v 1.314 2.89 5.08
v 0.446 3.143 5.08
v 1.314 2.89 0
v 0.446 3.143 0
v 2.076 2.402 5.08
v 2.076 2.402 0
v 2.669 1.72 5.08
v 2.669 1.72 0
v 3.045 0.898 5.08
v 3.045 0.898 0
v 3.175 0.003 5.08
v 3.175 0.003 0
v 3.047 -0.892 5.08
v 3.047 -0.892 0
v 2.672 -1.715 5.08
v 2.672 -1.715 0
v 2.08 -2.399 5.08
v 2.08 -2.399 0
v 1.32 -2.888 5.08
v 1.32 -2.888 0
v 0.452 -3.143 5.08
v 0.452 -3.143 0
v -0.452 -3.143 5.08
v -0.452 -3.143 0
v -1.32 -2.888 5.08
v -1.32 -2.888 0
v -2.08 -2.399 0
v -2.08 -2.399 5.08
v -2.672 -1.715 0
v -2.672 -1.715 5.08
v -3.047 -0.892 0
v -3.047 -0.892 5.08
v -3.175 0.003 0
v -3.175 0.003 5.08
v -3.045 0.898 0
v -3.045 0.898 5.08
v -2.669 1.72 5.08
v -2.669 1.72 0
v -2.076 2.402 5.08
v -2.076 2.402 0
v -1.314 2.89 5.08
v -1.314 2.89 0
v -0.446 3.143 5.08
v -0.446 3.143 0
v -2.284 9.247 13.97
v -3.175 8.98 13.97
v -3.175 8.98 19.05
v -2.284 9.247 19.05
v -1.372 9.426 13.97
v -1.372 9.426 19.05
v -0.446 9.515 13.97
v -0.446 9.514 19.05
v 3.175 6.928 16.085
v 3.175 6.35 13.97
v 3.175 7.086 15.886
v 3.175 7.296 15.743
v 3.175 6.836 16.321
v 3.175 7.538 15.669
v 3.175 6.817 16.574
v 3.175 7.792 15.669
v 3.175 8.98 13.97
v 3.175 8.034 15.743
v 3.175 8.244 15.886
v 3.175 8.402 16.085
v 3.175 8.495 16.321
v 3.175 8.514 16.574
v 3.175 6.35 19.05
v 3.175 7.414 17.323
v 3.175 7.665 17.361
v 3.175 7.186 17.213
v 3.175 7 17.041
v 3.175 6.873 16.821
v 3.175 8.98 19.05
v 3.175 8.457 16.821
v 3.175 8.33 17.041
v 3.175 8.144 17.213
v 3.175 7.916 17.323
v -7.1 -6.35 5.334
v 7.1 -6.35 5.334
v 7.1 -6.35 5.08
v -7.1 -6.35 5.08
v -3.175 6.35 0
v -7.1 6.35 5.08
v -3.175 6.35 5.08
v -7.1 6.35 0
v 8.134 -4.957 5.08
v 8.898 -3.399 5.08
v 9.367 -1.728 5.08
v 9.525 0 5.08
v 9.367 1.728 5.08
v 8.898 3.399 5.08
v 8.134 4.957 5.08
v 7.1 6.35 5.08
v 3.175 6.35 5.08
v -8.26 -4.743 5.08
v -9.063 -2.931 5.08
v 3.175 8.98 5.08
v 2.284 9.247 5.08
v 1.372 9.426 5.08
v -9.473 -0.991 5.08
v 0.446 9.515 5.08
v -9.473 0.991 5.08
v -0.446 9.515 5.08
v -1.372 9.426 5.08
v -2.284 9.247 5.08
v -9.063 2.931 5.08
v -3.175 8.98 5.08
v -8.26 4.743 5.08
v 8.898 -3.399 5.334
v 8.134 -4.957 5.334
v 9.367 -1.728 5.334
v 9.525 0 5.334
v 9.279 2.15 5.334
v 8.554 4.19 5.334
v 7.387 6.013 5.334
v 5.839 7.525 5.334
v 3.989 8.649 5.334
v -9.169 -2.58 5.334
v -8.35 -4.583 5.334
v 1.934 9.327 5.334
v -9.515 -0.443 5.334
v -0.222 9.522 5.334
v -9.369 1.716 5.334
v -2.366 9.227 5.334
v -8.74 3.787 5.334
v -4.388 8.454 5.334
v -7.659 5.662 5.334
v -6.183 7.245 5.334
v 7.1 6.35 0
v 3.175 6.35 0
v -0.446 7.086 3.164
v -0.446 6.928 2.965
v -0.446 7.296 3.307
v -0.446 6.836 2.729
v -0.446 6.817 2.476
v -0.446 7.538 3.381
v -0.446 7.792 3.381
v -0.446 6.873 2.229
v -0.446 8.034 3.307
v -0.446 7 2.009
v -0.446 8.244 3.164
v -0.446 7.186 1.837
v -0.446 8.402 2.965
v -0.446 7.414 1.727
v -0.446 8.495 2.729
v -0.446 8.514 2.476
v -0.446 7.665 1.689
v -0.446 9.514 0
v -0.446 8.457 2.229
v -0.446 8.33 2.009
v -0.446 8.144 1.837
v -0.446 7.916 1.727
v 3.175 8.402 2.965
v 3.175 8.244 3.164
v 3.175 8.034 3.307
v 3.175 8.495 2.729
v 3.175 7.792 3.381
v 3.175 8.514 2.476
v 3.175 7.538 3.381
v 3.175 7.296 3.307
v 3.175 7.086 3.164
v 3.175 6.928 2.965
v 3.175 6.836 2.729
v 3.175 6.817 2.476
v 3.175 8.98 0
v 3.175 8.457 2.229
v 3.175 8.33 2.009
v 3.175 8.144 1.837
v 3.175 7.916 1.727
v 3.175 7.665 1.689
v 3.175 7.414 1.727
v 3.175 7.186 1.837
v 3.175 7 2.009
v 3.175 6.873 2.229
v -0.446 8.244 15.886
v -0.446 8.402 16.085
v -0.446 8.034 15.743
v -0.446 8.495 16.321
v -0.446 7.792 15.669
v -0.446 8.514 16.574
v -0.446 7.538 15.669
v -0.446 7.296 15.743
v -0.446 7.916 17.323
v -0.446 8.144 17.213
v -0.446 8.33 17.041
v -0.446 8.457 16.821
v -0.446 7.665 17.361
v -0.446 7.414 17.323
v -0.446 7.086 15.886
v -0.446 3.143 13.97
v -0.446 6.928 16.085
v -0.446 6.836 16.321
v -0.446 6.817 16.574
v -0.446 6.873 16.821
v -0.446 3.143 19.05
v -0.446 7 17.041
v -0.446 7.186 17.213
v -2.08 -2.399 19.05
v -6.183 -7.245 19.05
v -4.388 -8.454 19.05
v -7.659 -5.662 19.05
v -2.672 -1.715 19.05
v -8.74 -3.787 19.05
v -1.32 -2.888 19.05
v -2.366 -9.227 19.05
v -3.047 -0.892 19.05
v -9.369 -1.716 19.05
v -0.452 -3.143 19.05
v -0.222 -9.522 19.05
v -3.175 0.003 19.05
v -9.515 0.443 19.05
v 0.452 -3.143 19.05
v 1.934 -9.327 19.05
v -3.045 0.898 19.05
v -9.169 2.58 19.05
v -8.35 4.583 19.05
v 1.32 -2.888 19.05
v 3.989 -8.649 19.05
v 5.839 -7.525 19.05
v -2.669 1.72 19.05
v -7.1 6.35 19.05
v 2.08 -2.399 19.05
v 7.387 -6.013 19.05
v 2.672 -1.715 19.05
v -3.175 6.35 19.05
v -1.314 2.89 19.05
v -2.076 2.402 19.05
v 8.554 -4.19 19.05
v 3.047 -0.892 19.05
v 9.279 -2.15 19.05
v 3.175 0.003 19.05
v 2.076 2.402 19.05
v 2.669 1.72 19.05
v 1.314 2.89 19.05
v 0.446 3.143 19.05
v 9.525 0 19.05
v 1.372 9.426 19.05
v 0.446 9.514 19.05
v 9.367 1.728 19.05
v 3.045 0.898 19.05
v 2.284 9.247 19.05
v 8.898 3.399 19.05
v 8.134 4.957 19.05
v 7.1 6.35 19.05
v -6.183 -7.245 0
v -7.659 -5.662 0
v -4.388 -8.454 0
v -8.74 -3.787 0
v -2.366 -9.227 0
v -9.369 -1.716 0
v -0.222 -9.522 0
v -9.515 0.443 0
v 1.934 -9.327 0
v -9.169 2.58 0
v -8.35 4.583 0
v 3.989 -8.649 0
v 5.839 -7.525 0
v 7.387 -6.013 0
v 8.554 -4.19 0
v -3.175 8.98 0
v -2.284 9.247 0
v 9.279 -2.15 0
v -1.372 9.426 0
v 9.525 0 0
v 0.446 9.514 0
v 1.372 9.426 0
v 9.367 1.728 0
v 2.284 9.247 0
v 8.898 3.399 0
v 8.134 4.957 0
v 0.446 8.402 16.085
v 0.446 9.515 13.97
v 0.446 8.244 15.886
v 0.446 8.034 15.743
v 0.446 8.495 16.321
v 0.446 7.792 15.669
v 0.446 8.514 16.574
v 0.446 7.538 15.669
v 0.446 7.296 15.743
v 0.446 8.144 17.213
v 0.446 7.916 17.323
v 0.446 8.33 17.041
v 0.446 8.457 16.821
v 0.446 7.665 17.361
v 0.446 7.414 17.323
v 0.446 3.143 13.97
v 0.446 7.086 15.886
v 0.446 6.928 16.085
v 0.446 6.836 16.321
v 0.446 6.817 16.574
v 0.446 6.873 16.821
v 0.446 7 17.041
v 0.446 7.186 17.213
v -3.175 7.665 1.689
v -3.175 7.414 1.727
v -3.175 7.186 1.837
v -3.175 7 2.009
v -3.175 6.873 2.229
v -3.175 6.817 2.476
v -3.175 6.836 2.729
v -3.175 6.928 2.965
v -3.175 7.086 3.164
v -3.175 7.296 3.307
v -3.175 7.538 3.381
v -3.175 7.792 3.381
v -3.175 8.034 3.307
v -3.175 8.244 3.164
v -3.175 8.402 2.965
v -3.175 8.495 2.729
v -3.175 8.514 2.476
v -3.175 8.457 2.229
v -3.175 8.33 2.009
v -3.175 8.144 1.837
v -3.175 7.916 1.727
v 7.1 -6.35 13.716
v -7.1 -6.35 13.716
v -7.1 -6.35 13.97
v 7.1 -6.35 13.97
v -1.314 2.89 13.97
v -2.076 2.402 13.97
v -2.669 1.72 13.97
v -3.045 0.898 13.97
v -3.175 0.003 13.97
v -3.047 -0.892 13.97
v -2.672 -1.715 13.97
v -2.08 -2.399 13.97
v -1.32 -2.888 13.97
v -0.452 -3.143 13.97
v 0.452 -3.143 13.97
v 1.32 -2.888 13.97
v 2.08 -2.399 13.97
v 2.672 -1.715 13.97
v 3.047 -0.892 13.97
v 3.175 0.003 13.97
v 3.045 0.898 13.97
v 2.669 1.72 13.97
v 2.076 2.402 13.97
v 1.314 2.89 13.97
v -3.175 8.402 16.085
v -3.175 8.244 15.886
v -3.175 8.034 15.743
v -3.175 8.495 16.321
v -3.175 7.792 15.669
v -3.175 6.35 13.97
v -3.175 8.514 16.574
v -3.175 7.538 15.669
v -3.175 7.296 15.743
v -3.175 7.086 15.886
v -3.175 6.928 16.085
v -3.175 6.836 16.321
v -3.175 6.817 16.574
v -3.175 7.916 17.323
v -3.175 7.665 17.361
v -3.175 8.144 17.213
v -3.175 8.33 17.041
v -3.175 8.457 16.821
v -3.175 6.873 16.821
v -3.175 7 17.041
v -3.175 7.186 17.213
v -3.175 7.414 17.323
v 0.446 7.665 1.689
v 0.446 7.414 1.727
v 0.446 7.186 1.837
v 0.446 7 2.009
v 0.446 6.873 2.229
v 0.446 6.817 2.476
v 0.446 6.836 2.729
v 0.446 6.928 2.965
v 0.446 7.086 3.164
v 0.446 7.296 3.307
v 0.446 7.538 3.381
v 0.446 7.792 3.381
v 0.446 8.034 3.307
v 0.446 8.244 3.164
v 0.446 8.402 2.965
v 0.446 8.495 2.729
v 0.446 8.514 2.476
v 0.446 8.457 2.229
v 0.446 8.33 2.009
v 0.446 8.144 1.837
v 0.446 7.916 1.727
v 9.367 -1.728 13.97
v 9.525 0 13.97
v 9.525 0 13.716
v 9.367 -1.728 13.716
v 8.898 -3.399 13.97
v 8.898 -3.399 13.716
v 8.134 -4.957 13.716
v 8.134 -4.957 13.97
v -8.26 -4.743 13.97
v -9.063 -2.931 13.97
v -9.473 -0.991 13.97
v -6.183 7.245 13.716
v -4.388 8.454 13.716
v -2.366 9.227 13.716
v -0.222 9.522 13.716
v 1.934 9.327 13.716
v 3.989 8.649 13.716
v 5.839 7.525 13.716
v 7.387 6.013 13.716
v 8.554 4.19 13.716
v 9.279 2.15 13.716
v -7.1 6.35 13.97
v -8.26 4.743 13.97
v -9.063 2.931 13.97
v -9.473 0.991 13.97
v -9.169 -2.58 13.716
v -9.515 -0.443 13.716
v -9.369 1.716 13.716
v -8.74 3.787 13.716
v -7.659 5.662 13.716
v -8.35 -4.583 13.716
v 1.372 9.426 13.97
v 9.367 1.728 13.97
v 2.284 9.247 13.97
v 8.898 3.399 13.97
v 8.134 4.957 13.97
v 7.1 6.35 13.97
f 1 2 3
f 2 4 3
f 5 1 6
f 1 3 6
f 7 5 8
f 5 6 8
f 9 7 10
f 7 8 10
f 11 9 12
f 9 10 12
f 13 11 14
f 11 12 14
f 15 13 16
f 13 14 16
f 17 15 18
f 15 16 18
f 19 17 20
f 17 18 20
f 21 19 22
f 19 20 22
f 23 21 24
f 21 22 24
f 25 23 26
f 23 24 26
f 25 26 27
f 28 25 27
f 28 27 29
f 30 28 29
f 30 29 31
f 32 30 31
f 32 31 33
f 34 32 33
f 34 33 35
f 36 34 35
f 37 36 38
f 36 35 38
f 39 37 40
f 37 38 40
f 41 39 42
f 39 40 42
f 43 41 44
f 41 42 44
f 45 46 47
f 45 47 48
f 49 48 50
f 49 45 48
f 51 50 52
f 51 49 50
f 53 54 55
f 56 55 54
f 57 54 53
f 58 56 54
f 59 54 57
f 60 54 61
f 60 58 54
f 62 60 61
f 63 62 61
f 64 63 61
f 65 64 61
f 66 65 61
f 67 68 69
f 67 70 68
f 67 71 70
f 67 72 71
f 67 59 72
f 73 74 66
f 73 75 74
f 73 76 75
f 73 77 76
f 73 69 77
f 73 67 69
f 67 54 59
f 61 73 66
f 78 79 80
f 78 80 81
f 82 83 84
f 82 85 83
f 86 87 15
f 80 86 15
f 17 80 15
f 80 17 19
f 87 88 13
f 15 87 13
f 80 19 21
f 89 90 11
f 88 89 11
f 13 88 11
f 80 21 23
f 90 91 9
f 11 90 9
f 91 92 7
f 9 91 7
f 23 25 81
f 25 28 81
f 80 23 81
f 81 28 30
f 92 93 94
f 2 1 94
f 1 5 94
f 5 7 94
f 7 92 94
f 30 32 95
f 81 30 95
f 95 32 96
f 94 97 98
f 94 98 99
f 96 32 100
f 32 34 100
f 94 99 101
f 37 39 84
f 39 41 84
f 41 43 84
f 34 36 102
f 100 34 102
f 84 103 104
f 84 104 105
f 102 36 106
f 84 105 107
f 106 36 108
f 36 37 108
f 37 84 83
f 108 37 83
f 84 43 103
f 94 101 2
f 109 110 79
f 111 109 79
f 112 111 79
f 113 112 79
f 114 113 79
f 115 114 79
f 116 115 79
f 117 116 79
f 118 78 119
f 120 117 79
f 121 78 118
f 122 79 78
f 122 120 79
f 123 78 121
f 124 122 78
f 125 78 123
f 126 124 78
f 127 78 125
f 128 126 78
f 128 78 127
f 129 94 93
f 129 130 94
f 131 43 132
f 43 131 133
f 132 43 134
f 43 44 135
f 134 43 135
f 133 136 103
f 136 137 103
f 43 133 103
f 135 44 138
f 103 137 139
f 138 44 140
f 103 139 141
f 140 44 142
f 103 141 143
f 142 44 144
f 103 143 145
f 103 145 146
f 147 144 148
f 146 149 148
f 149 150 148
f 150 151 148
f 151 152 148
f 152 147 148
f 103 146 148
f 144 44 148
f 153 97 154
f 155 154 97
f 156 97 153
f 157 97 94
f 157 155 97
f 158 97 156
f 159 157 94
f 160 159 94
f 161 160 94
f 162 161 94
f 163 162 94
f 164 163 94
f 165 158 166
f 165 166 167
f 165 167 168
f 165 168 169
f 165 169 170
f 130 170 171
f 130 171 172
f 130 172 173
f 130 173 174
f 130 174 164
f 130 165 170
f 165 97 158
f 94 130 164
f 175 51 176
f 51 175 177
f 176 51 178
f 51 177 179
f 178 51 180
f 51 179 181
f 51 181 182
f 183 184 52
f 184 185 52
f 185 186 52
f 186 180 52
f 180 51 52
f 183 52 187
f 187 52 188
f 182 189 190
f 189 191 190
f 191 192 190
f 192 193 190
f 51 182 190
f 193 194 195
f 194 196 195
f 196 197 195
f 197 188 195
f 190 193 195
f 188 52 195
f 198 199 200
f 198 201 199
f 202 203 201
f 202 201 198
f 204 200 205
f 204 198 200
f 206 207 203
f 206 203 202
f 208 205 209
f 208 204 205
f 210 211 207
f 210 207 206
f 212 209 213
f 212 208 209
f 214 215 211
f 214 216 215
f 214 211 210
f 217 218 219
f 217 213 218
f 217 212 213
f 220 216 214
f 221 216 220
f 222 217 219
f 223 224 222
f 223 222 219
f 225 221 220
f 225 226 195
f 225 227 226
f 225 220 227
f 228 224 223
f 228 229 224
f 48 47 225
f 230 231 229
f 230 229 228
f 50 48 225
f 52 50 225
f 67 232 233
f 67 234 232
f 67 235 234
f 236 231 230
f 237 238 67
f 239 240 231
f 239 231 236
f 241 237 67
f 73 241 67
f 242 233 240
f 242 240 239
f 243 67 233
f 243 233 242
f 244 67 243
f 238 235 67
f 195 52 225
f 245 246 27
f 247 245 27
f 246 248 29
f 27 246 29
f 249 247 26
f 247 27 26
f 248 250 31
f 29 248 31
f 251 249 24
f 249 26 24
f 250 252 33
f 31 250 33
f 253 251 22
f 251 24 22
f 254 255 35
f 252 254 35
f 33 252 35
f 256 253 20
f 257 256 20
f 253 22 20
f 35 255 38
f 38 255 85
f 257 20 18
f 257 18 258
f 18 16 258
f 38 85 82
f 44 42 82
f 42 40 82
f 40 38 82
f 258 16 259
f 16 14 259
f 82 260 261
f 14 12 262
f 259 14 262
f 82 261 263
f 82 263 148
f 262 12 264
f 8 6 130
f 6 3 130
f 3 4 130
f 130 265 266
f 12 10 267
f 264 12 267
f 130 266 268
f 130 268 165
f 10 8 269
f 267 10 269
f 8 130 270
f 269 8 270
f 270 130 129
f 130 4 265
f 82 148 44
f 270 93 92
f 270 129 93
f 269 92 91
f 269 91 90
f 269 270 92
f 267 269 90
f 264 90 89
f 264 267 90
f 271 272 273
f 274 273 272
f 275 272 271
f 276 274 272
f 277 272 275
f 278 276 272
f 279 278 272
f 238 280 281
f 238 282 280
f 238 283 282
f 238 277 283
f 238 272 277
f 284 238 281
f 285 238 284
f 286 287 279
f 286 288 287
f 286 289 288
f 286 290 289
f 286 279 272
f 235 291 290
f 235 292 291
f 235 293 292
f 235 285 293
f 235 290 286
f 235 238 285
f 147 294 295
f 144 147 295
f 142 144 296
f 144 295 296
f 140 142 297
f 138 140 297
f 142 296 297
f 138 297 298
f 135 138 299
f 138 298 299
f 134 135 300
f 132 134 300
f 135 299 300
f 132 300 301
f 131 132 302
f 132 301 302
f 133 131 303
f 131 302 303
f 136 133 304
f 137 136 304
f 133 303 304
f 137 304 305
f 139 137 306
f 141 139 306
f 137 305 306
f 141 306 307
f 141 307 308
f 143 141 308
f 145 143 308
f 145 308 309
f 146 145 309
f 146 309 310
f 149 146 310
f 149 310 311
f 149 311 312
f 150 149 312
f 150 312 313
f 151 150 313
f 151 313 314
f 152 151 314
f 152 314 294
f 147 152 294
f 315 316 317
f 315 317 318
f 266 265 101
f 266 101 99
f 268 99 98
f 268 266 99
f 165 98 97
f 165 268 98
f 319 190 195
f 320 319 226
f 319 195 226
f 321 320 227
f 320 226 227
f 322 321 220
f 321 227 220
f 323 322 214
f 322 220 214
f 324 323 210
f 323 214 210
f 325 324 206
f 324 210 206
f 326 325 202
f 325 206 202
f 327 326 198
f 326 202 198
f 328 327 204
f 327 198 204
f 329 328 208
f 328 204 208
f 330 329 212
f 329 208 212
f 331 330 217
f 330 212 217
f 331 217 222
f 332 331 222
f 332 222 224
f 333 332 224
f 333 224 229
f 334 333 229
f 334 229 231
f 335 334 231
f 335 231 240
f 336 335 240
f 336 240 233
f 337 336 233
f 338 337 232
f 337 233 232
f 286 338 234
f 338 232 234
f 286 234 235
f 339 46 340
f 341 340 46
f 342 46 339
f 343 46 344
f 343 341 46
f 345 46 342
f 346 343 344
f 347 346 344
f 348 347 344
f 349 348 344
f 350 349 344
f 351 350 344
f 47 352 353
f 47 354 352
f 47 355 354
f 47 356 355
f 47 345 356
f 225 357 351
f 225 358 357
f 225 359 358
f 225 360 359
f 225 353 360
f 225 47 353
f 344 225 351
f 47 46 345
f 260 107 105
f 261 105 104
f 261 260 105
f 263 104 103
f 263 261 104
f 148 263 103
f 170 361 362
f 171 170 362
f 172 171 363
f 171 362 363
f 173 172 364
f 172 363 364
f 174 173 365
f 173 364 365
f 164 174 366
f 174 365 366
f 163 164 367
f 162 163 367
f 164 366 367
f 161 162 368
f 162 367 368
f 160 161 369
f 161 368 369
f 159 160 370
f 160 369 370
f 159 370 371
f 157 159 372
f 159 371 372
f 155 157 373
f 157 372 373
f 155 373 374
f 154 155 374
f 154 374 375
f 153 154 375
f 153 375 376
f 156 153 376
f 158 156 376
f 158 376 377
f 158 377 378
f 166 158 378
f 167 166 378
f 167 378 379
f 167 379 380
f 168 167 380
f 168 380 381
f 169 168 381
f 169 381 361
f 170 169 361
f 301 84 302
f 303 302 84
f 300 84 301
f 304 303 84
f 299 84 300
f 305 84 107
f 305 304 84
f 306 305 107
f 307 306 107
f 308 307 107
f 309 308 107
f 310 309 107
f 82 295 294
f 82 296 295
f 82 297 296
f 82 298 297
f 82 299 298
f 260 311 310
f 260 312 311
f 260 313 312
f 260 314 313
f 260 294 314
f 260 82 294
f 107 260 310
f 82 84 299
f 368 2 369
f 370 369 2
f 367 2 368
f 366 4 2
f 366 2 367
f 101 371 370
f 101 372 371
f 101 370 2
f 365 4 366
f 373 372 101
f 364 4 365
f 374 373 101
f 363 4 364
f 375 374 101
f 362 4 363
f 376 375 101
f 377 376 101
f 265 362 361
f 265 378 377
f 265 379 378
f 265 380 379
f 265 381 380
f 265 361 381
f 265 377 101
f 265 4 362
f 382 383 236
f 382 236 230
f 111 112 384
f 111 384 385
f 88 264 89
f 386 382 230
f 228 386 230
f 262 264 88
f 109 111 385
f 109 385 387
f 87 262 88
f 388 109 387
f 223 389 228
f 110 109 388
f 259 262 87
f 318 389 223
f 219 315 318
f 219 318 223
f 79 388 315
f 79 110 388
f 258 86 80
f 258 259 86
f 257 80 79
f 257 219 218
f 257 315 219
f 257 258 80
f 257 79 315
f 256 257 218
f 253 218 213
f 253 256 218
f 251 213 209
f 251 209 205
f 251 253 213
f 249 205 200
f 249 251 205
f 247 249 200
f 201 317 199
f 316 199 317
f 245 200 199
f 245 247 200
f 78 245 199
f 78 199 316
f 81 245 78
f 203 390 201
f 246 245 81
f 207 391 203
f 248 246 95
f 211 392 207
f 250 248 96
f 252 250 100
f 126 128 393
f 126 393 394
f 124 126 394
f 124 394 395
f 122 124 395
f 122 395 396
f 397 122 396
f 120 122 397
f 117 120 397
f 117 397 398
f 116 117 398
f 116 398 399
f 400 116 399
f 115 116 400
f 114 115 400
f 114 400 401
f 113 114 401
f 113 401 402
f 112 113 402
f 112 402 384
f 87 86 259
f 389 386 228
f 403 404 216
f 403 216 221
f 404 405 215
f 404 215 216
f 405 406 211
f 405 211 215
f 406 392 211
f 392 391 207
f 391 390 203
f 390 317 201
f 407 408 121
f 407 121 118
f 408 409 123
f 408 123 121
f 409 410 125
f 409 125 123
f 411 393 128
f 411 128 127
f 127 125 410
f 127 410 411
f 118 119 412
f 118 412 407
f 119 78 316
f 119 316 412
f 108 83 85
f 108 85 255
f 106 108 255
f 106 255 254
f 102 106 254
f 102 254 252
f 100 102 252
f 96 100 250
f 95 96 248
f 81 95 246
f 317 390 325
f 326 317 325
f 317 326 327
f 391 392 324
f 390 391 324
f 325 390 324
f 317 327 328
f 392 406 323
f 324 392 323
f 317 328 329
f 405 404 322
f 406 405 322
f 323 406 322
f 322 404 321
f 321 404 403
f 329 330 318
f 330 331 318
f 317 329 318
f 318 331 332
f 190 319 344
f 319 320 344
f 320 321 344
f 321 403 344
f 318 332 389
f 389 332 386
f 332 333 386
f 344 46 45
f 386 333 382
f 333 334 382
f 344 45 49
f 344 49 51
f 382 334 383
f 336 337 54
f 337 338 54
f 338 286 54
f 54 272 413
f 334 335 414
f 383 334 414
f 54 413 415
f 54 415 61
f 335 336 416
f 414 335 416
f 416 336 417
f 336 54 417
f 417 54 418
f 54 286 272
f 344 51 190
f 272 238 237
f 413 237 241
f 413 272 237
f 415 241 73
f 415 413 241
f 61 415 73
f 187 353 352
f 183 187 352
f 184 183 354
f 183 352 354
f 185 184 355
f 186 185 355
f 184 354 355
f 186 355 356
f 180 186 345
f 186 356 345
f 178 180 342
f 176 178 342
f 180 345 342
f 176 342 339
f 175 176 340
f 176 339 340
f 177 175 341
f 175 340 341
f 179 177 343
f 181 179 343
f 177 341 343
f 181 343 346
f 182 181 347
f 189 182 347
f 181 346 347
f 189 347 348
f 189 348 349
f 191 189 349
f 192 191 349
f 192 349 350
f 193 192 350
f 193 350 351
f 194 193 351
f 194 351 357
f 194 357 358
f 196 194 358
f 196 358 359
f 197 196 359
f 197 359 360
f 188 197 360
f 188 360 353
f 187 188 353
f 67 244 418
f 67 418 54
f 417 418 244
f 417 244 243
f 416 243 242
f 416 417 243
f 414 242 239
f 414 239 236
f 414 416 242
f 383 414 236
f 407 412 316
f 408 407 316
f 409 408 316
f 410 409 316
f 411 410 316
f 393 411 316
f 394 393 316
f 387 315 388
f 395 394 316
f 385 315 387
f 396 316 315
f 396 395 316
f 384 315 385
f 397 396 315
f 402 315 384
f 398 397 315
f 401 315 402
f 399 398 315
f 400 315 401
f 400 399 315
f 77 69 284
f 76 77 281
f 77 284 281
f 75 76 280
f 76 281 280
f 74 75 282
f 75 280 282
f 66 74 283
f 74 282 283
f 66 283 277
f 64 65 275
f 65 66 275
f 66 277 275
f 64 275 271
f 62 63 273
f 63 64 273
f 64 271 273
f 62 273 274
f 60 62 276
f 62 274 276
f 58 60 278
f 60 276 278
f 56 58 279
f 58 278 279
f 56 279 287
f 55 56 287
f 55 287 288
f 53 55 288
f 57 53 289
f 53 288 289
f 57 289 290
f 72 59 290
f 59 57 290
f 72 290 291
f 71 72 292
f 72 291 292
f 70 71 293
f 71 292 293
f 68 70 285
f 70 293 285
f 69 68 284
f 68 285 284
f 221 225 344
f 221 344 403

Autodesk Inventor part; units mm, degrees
ref_plane "YZ Plane" through (0, 0, 0) normal (1, 0, 0) x (0, 1, 0)
ref_plane "XZ Plane" through (0, 0, 0) normal (0, 1, 0) x (-1, 0, 0)
sketch "Sketch1" plane through (0, 0, 0) normal (0, 0, 1) x (1, 0, 0)
  circle A0 centre (0, 0) radius 9.525
  circle A1 centre (0, 0) radius 3.175
  line L0 (0, 0) -> (-0.4464, 0)
  line L1 (-0.4464, 0) -> (-0.4464, 9.5145)
  line L2 (0, 0) -> (0.4464, 0)
  line L3 (0.4464, 0) -> (0.4464, 9.5145)
  line L4 (0, 0) -> (0, 9.525)
  line L5 (-7.0995, 6.35) -> (-3.175, 6.35)
  line L6 (-3.175, 6.35) -> (-3.175, 8.9803)
  line L7 (3.175, 8.9803) -> (3.175, 6.35)
  line L8 (3.175, 6.35) -> (7.0995, 6.35)
  dimension "d0" = 19.05
  dimension "d1" = 6.35
  dimension "d4" = 3.175
  dimension "d5" = 0.4464
  dimension "d6" = 3.175
  dimension "d7" = 3.175
extrude "Extrusion1" add sketch "Sketch1" along normal blind 19.05
extrude "Extrusion2" cut sketch "Sketch1" along normal blind 5.334 contours L8 L7 A0 | A0 L6 L5 | L3 A1 L4 A0 | A0 L4 A1 L1 | L3 L2 L4 A1 | A1 L1 L0 L2 L3 | A1 L4 L0 L1
sketch "Sketch2" plane through (0, 0, 5.334) normal (0, 0, -1) x (-1, 0, 0)
  line L0 (-3.175, 8.9803) -> (-3.175, 6.35) projected
  arc A0 (-3.175, 8.9803) -> (-7.0995, 6.35) centre (0, 0) ccw projected
  line L1 (-3.175, 6.35) -> (-7.0995, 6.35) projected
  circle A1 centre (0, 0) radius 9.525
  line L2 (-7.0995, -6.35) -> (7.0995, -6.35)
  dimension "d10" = 6.35
extrude "Extrusion3" cut sketch "Sketch2" along normal blind 0.254 contours A1 L2 L1 L0
ref_plane "Work Plane1" through (0, 0, 9.525) normal (0, 0, -1) x (-1, 0, 0)
sketch "Sketch3" plane through (3.175, 6.35, 0) normal (1, 0, 0) x (0, 0, -1)
  line L0 (0, 0) -> (-5.08, 0) projected
  line L1 (0, 2.6303) -> (0, 0) projected
  point P0 (0, -6.35)
  point P1 (-2.54, 1.3151)
  dimension "d14" = 2.54
  dimension "d15" = 1.3151
hole "Hole1" at (3.175, 7.6651, 2.54) direction (-1, 0, 0) diameter 1.7018 depth 25.4 tip angle 118
mirror "Mirror1" about plane through (0, 0, 9.525) normal (0, 0, -1) of "Extrusion2", "Extrusion3", "Hole1"
equation "\"d7\" = d6"
properties part number "Flexible Shaft Coupler 6208K411"
